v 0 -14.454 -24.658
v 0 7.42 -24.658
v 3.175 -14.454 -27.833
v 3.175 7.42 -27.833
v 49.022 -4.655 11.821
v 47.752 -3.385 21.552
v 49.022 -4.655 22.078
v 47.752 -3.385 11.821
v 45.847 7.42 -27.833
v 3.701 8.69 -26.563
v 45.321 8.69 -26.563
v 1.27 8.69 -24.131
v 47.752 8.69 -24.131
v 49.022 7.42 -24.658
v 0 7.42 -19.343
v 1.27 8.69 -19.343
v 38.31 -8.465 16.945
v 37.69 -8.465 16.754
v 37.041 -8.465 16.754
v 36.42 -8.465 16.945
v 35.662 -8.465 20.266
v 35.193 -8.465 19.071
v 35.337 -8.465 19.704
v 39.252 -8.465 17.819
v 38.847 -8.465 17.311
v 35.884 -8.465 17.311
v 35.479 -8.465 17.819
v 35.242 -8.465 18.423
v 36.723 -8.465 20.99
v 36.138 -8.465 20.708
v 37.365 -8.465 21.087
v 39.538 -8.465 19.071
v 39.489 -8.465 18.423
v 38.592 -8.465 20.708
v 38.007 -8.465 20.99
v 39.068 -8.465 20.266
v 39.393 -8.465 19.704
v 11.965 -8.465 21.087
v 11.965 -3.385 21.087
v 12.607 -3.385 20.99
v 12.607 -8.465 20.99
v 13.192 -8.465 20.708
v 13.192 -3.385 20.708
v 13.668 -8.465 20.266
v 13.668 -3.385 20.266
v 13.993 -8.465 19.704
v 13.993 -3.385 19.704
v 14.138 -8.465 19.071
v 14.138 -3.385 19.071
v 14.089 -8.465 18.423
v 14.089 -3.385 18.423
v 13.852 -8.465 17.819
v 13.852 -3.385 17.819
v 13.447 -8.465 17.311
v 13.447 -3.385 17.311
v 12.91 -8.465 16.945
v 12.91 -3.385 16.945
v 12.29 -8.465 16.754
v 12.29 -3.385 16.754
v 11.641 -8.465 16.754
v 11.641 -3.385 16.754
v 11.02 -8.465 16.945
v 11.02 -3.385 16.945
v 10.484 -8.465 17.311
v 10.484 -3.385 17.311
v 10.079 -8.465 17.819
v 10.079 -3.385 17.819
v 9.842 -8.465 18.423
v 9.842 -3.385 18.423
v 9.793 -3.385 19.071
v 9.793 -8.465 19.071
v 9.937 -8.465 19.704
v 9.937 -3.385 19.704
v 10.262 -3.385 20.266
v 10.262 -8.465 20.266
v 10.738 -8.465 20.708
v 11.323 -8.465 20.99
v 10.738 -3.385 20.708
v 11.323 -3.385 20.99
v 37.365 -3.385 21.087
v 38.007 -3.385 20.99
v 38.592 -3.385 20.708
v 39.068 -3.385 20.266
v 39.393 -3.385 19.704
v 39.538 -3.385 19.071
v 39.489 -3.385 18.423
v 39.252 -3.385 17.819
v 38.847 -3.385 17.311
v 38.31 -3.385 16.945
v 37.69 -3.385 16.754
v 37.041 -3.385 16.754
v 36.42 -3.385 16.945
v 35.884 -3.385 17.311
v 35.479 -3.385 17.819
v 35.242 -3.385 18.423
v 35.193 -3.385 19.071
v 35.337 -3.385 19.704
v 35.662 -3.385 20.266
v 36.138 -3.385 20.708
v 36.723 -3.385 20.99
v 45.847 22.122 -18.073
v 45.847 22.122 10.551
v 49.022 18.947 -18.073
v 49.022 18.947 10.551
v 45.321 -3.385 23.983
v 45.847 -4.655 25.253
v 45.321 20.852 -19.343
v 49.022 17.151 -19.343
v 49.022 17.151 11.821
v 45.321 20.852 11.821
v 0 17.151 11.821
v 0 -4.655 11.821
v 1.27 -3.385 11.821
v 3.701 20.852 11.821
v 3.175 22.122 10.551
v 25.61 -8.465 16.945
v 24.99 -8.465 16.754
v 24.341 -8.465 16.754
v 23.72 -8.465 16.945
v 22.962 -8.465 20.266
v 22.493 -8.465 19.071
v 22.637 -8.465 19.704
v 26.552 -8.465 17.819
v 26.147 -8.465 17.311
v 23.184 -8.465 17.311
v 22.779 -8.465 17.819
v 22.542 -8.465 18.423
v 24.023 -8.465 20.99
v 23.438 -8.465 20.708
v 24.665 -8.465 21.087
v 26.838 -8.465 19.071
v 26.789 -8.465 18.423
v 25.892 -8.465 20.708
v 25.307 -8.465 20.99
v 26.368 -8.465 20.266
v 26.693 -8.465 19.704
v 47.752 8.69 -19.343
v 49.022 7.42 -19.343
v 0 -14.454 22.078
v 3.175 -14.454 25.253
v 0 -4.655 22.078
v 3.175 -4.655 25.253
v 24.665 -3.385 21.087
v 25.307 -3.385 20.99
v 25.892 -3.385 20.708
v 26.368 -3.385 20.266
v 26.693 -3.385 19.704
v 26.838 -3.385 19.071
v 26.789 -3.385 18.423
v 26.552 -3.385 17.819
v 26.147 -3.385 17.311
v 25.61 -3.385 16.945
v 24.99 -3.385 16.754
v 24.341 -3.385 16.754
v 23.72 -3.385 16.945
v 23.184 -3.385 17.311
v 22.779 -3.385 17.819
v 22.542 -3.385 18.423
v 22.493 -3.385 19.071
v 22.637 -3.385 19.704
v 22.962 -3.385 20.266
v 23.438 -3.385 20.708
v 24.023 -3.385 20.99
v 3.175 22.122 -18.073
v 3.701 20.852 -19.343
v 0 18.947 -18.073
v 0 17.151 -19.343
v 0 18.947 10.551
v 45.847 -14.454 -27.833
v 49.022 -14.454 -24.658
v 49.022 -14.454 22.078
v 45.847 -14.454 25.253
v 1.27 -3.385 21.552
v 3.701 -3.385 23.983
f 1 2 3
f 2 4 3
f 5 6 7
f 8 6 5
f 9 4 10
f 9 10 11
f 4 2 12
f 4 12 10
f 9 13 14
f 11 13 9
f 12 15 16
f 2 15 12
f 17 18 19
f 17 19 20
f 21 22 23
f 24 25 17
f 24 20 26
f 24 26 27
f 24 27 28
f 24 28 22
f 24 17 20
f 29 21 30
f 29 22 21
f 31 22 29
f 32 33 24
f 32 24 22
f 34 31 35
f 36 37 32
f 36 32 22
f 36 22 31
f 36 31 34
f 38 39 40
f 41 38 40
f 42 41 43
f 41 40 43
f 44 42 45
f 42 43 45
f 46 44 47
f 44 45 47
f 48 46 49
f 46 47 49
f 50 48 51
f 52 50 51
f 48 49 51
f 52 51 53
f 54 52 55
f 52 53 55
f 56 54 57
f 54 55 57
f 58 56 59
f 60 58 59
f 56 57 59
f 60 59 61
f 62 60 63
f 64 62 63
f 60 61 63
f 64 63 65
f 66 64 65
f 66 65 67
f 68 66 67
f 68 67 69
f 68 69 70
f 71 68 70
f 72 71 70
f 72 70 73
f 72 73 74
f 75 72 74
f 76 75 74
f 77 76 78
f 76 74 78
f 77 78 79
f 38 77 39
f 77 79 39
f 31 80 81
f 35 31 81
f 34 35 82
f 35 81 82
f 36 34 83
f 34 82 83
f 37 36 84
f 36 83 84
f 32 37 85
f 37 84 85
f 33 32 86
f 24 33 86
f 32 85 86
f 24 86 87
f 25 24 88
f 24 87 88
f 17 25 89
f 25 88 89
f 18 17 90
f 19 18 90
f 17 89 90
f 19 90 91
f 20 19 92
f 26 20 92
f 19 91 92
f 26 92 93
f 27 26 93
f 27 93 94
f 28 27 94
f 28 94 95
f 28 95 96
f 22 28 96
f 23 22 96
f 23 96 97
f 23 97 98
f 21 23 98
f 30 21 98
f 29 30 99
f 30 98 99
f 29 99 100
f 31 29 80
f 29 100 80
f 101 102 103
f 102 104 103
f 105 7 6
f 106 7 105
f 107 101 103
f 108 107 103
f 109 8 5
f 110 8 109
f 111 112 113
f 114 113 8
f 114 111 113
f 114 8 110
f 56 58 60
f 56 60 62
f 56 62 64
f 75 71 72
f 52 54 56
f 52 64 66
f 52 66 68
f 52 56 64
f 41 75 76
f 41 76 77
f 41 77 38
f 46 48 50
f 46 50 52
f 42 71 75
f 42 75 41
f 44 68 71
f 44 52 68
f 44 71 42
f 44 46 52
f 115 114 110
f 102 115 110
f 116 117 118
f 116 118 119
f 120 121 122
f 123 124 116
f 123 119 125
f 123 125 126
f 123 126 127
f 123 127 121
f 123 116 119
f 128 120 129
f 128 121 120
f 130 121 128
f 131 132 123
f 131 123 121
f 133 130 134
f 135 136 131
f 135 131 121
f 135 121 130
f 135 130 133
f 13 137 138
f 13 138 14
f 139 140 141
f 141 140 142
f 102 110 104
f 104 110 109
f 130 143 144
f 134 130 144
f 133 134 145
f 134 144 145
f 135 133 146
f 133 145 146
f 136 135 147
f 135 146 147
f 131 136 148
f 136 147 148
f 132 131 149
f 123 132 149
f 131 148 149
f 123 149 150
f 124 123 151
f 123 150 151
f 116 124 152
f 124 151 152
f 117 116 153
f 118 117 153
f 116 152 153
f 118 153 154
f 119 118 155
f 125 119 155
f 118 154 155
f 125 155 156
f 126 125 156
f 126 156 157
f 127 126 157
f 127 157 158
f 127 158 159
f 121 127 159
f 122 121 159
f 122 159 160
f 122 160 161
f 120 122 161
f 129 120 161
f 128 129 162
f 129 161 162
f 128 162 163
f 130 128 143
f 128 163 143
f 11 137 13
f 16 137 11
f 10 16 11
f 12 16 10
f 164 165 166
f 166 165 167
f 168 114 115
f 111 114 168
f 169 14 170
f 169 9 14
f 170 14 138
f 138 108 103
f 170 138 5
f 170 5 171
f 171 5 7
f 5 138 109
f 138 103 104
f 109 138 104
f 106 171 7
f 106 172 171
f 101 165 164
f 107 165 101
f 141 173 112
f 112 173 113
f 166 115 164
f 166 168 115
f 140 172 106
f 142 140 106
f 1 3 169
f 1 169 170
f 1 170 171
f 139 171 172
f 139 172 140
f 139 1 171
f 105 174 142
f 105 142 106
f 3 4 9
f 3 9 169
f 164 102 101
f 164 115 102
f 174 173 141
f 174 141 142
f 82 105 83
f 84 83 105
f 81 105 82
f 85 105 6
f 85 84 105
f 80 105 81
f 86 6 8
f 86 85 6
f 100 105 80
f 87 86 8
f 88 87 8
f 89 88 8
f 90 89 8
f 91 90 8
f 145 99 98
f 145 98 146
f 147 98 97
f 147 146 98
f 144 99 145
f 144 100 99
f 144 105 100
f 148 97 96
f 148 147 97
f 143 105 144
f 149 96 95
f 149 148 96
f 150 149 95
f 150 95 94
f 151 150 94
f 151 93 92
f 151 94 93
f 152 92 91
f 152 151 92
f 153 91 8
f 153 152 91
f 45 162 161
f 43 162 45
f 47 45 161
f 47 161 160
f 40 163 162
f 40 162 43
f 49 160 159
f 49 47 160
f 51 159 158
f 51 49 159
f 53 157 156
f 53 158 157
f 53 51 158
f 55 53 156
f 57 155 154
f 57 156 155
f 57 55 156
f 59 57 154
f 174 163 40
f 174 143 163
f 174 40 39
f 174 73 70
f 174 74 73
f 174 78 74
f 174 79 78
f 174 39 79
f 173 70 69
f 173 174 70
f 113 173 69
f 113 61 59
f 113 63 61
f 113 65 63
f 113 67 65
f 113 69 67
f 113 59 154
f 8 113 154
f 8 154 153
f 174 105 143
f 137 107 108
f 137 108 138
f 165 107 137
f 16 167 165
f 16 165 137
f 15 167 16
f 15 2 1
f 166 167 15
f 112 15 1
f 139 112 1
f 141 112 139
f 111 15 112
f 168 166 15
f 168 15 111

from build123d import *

# Parameters (mm, degrees)
BOSS_EXTRUDE1_DEPTH = 49.022
CHAMFER4_SIZE       = 3.175
CHAMFER5_SIZE       = 3.175
CHAMFER6_SIZE       = 3.175
SKETCH4_R           = 2.178410544
CUT_EXTRUDE1_DEPTH  = 5.08
CHAMFER7_SIZE       = 1.27
CHAMFER8_SIZE       = 1.27
CHAMFER9_SIZE       = 1.27


with BuildPart() as part:
    # Sketch1 → Boss-Extrude1 (new body)
    with BuildSketch(Plane(origin=(0, 0, 0), x_dir=(0, 0, -1), z_dir=(1, 0, 0))):
        Polygon((19.343076923, 8.689730769), (27.832538462, 8.689730769), (27.832538462, -14.453576923), (-25.253461538, -14.453576923), (-25.253461538, -3.385038462), (-11.820769231, -3.385038462), (-11.820769231, 22.122423077), (19.343076923, 22.122423077), align=None)
    extrude(amount=BOSS_EXTRUDE1_DEPTH)

    # Chamfer4
    chamfer4_edges = [part.edges().sort_by_distance(p)[0] for p in [
        (0, 22.122423077, -3.761153846),
    ]]
    chamfer(chamfer4_edges, length=CHAMFER4_SIZE)

    # Chamfer5
    chamfer5_edges = [part.edges().sort_by_distance(p)[0] for p in [
        (49.022, 22.122423077, -3.761153846),
    ]]
    chamfer(chamfer5_edges, length=CHAMFER5_SIZE)

    # Chamfer6
    chamfer6_edges = [part.edges().sort_by_distance(p)[0] for p in [
        (0, -2.881923077, -27.832538462),
        (0, -8.919307692, 25.253461538),
        (49.022, -2.881923077, -27.832538462),
        (49.022, -8.919307692, 25.253461538),
    ]]
    chamfer(chamfer6_edges, length=CHAMFER6_SIZE)

    # Sketch4 → Cut-Extrude1 (cut)
    with BuildSketch(Plane(origin=(0, -3.385038462, 0), x_dir=(1, 0, 0), z_dir=(0, 1, 0))):
        with Locations(Location((24.66531327, -18.90809717, 0), (0, 0, 270))):
            Circle(SKETCH4_R)
        with Locations(Location((37.36531327, -18.90809717, 0), (0, 0, 270))):
            Circle(SKETCH4_R)
        with Locations(Location((11.96531327, -18.90809717, 0), (0, 0, 270))):
            Circle(SKETCH4_R)
    extrude(amount=-CUT_EXTRUDE1_DEPTH, mode=Mode.SUBTRACT)

    # Chamfer7
    chamfer7_edges = [part.edges().sort_by_distance(p)[0] for p in [
        (49.022, 8.689730769, -22.000307692),
        (0, 8.689730769, -22.000307692),
        (24.511, 8.689730769, -27.832538462),
        (1.5875, 8.689730769, -26.245038462),
        (47.4345, 8.689730769, -26.245038462),
    ]]
    chamfer(chamfer7_edges, length=CHAMFER7_SIZE)

    # Chamfer8
    chamfer8_edges = [part.edges().sort_by_distance(p)[0] for p in [
        (0, -3.385038462, 16.949615385),
        (49.022, -3.385038462, 16.949615385),
        (24.511, -3.385038462, 25.253461538),
        (1.5875, -3.385038462, 23.665961538),
        (47.4345, -3.385038462, 23.665961538),
    ]]
    chamfer(chamfer8_edges, length=CHAMFER8_SIZE)

    # Chamfer9
    chamfer9_edges = [part.edges().sort_by_distance(p)[0] for p in [
        (1.5875, 20.534923077, 11.820769231),
        (1.5875, 20.534923077, -19.343076923),
        (24.511, 22.122423077, 11.820769231),
        (47.4345, 20.534923077, 11.820769231),
        (24.511, 22.122423077, -19.343076923),
        (47.4345, 20.534923077, -19.343076923),
    ]]
    chamfer(chamfer9_edges, length=CHAMFER9_SIZE)


solid = part.part
